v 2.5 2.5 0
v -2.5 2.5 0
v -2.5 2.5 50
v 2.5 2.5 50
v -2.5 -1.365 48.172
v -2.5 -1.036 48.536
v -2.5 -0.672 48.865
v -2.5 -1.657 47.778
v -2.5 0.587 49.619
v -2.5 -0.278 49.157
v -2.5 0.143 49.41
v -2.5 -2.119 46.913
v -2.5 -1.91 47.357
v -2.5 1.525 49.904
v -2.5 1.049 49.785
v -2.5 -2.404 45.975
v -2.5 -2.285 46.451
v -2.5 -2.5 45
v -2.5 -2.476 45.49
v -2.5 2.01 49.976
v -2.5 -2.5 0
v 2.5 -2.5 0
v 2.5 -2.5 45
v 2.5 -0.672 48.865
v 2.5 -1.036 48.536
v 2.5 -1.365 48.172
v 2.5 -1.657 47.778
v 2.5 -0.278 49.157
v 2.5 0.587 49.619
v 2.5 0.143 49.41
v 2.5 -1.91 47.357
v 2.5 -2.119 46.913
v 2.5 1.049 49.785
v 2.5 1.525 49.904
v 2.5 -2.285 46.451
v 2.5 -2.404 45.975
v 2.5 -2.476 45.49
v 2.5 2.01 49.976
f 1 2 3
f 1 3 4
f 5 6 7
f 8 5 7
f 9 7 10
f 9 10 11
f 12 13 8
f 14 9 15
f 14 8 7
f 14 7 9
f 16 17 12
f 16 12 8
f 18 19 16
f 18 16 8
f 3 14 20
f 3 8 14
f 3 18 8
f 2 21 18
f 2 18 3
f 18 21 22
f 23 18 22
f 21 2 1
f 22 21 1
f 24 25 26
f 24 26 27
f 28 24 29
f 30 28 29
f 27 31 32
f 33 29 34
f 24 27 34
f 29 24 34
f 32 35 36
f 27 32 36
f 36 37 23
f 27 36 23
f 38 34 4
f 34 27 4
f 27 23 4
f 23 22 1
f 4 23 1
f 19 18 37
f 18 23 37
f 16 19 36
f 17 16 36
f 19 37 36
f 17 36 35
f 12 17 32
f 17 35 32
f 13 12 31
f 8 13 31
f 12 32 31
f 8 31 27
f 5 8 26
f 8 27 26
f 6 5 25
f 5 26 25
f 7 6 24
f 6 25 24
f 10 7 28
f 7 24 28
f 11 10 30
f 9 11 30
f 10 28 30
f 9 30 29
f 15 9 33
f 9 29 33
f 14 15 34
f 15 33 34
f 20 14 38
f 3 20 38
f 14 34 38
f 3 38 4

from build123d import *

# Parameters (mm, degrees)
F0_W     = 5
F0_H     = 5
F1_DEPTH = 50
F2_R     = 4.99999


# Not quite as in the source:
# - a fillet or chamfer is up to 0.001 mm smaller than in the source, because OpenCascade refuses the exact size


with BuildPart() as f1:
    # F0 (on Top) → F1 (new body)
    with BuildSketch(Plane.XY):
        Rectangle(F0_W, F0_H)
    extrude(amount=F1_DEPTH)

    # F2 (radius 5 in the source; OpenCascade refuses exactly that, so slightly less here)
    f2_edges = [f1.edges().sort_by_distance(p)[0] for p in [
        (0, -2.5, 50),
    ]]
    fillet(f2_edges, radius=F2_R)


solid = f1.part
